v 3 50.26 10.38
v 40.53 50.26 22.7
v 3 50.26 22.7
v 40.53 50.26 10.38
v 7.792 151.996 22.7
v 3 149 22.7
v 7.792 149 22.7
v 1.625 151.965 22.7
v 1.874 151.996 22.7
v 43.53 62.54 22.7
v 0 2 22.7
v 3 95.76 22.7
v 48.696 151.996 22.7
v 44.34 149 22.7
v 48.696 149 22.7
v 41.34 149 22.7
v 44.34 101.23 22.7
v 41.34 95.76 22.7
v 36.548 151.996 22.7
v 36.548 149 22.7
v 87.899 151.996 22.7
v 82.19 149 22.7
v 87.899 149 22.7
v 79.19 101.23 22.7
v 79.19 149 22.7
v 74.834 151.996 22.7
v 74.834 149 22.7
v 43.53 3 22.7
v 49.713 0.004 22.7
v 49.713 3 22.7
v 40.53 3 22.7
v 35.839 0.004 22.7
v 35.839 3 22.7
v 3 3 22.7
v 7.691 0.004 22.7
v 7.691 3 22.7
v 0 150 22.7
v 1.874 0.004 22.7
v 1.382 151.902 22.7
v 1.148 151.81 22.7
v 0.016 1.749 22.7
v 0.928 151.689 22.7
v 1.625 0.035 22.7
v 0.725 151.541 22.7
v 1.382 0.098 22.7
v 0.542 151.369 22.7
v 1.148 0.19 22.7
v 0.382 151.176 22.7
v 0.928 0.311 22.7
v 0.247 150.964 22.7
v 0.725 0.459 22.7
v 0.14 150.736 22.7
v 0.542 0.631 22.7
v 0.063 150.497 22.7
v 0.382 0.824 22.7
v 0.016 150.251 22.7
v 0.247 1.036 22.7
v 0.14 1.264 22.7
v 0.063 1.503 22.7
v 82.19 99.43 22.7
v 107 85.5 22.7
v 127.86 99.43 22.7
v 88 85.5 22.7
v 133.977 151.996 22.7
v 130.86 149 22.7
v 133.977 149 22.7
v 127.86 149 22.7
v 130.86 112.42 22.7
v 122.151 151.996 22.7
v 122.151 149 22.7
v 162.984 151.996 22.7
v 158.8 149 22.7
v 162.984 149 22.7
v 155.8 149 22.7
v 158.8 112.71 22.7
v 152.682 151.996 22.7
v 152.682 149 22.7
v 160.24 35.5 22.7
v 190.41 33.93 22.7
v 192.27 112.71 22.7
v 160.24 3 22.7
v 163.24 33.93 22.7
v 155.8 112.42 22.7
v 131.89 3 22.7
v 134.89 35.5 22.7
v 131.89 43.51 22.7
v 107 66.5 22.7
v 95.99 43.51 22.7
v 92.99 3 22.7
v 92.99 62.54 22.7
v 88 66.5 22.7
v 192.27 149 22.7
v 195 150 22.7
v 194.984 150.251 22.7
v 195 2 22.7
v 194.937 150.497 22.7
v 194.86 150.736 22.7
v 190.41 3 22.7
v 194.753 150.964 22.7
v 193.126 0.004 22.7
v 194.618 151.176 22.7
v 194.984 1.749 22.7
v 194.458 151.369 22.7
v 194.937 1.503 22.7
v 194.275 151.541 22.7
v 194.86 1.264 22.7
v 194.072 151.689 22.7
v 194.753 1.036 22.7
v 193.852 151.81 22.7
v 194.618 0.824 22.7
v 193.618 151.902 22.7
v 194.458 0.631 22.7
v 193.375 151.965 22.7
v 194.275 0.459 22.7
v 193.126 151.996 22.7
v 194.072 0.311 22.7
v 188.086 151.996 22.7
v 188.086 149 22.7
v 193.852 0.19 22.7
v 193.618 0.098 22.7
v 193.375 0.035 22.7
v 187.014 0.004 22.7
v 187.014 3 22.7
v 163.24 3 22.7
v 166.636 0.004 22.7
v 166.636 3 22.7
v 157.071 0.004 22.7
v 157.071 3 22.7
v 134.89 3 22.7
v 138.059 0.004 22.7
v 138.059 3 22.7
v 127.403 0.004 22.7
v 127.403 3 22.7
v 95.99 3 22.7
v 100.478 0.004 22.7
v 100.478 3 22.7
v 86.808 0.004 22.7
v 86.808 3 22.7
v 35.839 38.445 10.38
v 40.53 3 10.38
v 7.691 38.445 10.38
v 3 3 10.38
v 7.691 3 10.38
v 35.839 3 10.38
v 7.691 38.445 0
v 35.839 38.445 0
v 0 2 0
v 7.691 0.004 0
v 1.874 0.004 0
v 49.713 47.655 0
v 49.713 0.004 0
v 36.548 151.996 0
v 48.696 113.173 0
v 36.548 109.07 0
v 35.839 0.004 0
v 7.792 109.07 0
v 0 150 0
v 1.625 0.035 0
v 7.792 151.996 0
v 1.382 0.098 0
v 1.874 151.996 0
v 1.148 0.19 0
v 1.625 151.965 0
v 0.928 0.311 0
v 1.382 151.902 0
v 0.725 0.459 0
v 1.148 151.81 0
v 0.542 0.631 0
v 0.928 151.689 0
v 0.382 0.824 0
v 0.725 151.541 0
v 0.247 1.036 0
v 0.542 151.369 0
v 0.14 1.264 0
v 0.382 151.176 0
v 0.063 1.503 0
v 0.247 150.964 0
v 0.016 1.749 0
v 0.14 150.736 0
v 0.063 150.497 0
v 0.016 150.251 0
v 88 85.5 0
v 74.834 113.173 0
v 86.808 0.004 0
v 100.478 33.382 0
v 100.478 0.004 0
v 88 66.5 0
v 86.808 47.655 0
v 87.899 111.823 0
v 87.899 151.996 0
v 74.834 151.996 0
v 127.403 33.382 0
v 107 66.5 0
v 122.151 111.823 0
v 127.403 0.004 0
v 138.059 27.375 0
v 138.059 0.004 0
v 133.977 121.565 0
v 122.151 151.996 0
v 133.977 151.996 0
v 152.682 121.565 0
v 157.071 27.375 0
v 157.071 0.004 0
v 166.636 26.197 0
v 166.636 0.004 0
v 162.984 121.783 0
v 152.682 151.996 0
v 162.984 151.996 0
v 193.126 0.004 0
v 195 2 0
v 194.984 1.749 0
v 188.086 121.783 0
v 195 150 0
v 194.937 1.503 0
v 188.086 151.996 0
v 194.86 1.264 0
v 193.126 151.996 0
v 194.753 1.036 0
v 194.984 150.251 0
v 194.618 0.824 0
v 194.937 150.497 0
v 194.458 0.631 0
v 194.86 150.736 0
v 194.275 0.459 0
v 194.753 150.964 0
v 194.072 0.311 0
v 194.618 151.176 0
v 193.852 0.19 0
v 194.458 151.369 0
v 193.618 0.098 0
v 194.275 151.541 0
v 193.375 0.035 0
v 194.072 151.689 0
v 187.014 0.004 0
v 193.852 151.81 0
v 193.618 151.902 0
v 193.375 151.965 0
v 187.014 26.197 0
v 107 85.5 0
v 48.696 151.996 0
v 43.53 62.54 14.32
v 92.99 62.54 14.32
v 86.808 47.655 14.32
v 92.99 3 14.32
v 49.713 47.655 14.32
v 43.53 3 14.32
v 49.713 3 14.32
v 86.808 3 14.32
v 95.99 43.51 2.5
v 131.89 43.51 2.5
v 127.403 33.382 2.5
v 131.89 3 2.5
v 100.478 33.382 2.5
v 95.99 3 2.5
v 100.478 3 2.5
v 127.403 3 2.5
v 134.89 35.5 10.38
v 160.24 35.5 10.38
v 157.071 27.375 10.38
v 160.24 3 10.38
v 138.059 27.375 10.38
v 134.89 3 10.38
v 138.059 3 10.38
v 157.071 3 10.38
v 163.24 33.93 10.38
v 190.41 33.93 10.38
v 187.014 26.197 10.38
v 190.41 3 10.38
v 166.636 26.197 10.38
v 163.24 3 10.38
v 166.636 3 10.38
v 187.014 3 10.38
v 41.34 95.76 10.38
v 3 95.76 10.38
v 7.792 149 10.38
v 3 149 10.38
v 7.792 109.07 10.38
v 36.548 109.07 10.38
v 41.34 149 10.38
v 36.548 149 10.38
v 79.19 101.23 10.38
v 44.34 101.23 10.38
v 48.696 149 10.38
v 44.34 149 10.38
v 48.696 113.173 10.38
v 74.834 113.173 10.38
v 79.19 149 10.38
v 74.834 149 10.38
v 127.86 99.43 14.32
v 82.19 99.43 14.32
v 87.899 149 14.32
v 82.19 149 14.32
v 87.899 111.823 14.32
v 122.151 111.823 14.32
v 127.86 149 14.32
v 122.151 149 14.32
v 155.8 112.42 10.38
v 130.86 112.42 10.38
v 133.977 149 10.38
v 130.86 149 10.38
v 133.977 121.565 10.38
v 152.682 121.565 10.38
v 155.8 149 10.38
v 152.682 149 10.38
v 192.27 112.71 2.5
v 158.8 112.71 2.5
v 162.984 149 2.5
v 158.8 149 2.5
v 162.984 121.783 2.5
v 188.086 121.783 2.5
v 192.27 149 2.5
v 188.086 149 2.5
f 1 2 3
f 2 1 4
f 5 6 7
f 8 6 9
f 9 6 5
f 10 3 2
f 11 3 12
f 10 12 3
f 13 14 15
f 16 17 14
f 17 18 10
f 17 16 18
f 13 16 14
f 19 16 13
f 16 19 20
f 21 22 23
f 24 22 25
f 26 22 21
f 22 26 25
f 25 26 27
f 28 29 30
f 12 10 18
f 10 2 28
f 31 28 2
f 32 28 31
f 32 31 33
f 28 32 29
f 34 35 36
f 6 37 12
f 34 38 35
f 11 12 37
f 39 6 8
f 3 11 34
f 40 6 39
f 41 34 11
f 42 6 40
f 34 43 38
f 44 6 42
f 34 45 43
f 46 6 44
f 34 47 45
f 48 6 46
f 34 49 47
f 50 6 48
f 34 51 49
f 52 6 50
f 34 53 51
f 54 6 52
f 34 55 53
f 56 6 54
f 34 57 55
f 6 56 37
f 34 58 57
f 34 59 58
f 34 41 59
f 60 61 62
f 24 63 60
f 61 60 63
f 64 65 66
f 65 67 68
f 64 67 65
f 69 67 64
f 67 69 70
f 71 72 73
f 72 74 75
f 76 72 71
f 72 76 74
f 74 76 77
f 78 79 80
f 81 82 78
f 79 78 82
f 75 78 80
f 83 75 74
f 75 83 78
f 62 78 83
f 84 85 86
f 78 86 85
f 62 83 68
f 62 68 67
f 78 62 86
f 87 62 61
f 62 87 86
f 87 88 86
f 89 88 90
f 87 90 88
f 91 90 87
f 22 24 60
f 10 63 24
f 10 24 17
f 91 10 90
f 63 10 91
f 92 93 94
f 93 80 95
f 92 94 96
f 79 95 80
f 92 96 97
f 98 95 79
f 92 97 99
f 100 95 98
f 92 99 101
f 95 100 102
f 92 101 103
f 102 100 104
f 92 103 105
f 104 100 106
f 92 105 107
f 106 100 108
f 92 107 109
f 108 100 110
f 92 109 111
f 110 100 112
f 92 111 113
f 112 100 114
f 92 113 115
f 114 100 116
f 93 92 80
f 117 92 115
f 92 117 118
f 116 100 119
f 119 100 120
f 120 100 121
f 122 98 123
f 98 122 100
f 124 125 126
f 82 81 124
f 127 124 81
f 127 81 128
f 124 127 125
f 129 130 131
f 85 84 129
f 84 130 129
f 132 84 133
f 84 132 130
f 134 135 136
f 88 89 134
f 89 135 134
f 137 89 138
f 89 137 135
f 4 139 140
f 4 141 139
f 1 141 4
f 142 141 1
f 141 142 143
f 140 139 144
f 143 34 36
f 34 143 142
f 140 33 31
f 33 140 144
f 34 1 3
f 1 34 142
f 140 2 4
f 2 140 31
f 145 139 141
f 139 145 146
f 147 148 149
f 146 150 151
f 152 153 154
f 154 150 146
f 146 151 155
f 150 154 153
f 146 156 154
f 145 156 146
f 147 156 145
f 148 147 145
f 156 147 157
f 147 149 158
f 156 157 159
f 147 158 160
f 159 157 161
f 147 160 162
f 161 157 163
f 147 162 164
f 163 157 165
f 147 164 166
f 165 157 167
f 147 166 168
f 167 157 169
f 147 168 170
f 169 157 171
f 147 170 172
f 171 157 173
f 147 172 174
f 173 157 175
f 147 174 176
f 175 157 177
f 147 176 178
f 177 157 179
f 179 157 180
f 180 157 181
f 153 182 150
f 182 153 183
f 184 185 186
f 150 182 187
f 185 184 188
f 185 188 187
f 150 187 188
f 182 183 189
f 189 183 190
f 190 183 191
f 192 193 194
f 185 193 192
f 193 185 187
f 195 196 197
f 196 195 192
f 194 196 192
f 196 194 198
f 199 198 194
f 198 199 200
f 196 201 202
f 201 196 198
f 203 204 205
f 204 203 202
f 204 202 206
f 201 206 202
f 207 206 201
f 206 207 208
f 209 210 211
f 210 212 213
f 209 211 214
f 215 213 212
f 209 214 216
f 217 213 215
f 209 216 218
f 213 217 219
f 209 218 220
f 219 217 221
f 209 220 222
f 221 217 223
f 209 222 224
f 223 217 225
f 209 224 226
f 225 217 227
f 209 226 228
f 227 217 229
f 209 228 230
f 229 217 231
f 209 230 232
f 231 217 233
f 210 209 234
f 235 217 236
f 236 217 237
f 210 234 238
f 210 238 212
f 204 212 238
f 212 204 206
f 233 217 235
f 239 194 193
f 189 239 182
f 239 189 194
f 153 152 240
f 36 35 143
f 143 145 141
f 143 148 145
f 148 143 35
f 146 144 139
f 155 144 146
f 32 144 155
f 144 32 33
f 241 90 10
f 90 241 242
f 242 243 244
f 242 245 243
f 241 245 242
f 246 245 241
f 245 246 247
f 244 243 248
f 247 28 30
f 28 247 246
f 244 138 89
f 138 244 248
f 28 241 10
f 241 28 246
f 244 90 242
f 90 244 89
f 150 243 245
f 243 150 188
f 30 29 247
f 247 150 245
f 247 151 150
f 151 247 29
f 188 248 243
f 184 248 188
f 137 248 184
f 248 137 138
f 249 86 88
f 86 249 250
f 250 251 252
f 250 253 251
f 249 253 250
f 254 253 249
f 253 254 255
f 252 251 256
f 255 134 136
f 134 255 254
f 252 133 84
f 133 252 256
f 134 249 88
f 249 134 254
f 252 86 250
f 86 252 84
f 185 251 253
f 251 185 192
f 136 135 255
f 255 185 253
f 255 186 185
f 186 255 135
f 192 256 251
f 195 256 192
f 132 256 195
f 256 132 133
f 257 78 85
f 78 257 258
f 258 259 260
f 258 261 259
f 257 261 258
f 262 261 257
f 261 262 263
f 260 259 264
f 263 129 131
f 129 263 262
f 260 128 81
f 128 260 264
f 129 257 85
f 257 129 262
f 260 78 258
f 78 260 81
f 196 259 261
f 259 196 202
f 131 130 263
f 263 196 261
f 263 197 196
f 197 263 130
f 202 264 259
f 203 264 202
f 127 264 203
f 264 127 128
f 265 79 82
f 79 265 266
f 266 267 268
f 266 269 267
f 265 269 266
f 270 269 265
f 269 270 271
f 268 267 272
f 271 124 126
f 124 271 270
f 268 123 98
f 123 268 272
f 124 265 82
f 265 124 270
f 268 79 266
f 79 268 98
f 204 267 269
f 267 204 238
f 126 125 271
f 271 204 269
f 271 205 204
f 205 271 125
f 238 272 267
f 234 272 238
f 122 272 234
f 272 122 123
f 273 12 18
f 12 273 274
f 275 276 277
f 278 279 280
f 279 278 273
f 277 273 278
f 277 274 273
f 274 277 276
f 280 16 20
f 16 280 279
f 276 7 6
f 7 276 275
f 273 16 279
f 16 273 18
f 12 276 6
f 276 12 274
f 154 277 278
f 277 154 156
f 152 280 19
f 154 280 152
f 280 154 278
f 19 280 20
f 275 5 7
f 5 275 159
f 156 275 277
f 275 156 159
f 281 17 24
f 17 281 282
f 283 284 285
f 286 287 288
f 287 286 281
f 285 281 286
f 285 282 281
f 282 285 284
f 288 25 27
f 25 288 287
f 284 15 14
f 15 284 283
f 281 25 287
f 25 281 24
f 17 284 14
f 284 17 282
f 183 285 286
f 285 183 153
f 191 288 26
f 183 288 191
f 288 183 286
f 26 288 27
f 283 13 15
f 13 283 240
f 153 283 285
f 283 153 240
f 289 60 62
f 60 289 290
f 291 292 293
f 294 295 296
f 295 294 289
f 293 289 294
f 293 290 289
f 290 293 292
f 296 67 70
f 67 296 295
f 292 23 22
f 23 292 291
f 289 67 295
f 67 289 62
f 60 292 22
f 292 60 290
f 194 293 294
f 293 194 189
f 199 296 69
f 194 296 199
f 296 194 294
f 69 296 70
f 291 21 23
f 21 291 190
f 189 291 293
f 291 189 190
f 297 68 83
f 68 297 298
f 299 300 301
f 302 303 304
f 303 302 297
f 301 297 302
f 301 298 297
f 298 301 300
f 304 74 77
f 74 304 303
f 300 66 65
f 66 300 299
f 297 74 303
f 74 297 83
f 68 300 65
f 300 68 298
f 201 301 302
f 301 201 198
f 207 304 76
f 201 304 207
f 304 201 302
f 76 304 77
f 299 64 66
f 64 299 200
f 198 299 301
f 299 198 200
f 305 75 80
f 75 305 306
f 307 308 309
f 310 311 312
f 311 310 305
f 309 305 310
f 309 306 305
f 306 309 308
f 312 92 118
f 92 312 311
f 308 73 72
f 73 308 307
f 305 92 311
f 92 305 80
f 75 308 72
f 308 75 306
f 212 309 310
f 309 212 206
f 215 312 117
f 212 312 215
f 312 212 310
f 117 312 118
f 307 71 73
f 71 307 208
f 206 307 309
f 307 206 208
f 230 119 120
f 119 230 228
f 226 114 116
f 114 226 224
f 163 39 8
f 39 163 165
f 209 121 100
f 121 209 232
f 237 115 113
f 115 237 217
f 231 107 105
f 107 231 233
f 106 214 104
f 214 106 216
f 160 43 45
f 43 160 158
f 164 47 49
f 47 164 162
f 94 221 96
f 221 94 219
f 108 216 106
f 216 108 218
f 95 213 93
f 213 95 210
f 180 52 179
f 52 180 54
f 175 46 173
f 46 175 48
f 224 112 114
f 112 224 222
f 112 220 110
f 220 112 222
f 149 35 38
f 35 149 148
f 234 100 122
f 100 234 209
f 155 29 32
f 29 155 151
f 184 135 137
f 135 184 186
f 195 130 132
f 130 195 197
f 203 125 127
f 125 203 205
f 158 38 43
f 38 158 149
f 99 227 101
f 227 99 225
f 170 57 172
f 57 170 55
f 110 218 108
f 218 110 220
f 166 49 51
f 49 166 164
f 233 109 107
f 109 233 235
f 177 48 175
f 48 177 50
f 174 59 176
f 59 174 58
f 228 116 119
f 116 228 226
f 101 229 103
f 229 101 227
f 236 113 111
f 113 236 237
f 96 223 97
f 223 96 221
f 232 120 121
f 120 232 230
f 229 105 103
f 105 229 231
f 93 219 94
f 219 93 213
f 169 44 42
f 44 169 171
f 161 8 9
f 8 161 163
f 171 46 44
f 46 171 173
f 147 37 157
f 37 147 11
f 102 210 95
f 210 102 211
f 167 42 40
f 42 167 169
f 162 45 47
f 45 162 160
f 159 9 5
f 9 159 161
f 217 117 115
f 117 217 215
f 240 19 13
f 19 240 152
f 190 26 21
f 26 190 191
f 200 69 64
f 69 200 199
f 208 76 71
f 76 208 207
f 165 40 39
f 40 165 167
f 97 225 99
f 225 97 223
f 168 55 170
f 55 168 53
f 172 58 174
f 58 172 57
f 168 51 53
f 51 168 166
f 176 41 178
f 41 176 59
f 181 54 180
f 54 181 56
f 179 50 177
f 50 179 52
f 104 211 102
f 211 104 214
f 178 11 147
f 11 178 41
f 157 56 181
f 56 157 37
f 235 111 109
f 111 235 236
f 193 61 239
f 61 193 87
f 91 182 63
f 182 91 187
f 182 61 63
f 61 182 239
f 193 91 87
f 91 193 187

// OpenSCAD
// file: SquarePileLib.scad
module LeftPile(wallThickness, totalHeight, singlePileHeight, singlePileWidth, singlePileLength, pileCount, openingSizePercent = .75){
    pileHeight = (pileCount * singlePileHeight) + .5;
    lengthOpeningSize = singlePileLength * openingSizePercent;
    widthOpeningSize = singlePileWidth * openingSizePercent;
    blockerSize = (singlePileWidth - widthOpeningSize) / 2;
    
    translate([wallThickness, wallThickness, totalHeight - pileHeight])
        cube([singlePileLength, singlePileWidth, pileHeight]);
    translate([-.00001, wallThickness + (blockerSize), 0])
        cube([wallThickness + lengthOpeningSize, widthOpeningSize, totalHeight]);
}

module RightPile(wallThickness, totalHeight, singlePileHeight, singlePileWidth, singlePileLength, pileCount, openingSizePercent = .75){
    translate([0, wallThickness + wallThickness + singlePileWidth, 0])
        rotate([0, 0, 180])
            LeftPile(wallThickness, totalHeight, singlePileHeight, singlePileWidth, singlePileLength, pileCount, openingSizePercent);
}

module BottomPile(wallThickness, totalHeight, singlePileHeight, singlePileWidth, singlePileLength, pileCount, openingSizePercent = .75){
    translate([wallThickness + wallThickness + singlePileWidth, 0, 0])
        rotate([0, 0, 90])
            LeftPile(wallThickness, totalHeight, singlePileHeight, singlePileWidth, singlePileLength, pileCount, openingSizePercent);
}

module TopPile(wallThickness, totalHeight, singlePileHeight, singlePileWidth, singlePileLength, pileCount, openingSizePercent = .75){
        rotate([0, 0, 270])
            LeftPile(wallThickness, totalHeight, singlePileHeight, singlePileWidth, singlePileLength, pileCount, openingSizePercent);
}
// main file
include<SquarePileLib.scad>

length = 195;

magnetHoleWidth = 19;
wallThickness = 3;
singlePileHeight = 1.97;
maxTokenHeight = 62;
maxTokenCount = 10;
width = wallThickness + maxTokenHeight + wallThickness + magnetHoleWidth + maxTokenHeight + wallThickness;
height = wallThickness + (maxTokenCount * singlePileHeight);
/*
Lurker 1	36.53	46.26	6
Lurker 2	48.46	58.54	4
Lurker 3	37.34	52.24	6
Lurker 4	33.85	46.77	6
Animal 1	44.67	48.57	4
Animal 2	32.47	35.29	10
Animal 3	24.35	31.5	6
Animal 4	23.94	35.58	6
Animal 5	26.17	29.93	6
Animal 6	34.9	39.51	10
*/
token1Width = 36.53 + 1;
token1Height = 46.26 + 1;
token1Count = 6;
token2Width = 48.46 + 1;
token2Height = 58.54 + 1;
token2Count = 4;
token3Width = 34.9 + 1;
token3Height = 39.51 + 1;
token3Count = 10;
token4Width = 24.35 + 1;
token4Height = 31.5 + 1;
token4Count = 6;
token5Width = 26.17 + 1;
token5Height = 29.93 + 1;
token5Count = 6;

token6Width = 37.34 + 1;
token6Height = 52.24 + 1;
token6Count = 6;
token7Width = 33.85 + 1;
token7Height = 46.77 + 1;
token7Count = 6;
token8Width = 44.67 + 1;
token8Height = 48.57 + 1;
token8Count = 4;
token9Width = 23.94 + 1;
token9Height = 35.58 + 1;
token9Count = 6;
token10Width = 32.47 + 1;
token10Height = 35.29 + 1;
token10Count = 10;


difference() {

    $fn=50;
    minkowski()
    {
      translate([2,2,0])
        cube([length-4, width-4, height - 1]);
      cylinder(r=2,h=1);
    }
    translate([0, 0, 0])
        BottomPile(
            wallThickness,
            height,
            singlePileHeight,
            token1Width,
            token1Height,
            token1Count
        );
    translate([token1Width + wallThickness, 0, 0])
        BottomPile(
            wallThickness,
            height,
            singlePileHeight,
            token2Width,
            token2Height,
            token2Count
        );
    translate([token1Width + token2Width + wallThickness * 2, 0, 0])
        BottomPile(
            wallThickness,
            height,
            singlePileHeight,
            token3Width,
            token3Height,
            token3Count
        );
    translate([token1Width + token2Width + token3Width + wallThickness * 3, 0, 0])
        BottomPile(
            wallThickness,
            height,
            singlePileHeight,
            token4Width,
            token4Height,
            token4Count
        );
    translate([token1Width + token2Width + token3Width + token4Width + wallThickness * 4, 0, 0])
        BottomPile(
            wallThickness,
            height,
            singlePileHeight,
            token5Width,
            token5Height,
            token5Count
        );
    
    translate([0, width, 0])
        TopPile(
            wallThickness,
            height,
            singlePileHeight,
            token6Width,
            token6Height,
            token6Count
        );
    translate([token6Width + wallThickness, width, 0])
        TopPile(
            wallThickness,
            height,
            singlePileHeight,
            token7Width,
            token7Height,
            token7Count
        );
    translate([token6Width + token7Width + wallThickness * 2, width, 0])
        TopPile(
            wallThickness,
            height,
            singlePileHeight,
            token8Width,
            token8Height,
            token8Count
        );
    translate([token6Width + token7Width + token8Width + wallThickness * 3, width, 0])
        TopPile(
            wallThickness,
            height,
            singlePileHeight,
            token9Width,
            token9Height,
            token9Count
        );
    translate([token6Width + token7Width + token8Width + token9Width + wallThickness * 4, width, 0])
        TopPile(
            wallThickness,
            height,
            singlePileHeight,
            token10Width,
            token10Height,
            token10Count
        );

    
    translate([length/2 - magnetHoleWidth/2, width/2 - magnetHoleWidth/2, 0])
        cube([magnetHoleWidth, magnetHoleWidth, height]);
}
